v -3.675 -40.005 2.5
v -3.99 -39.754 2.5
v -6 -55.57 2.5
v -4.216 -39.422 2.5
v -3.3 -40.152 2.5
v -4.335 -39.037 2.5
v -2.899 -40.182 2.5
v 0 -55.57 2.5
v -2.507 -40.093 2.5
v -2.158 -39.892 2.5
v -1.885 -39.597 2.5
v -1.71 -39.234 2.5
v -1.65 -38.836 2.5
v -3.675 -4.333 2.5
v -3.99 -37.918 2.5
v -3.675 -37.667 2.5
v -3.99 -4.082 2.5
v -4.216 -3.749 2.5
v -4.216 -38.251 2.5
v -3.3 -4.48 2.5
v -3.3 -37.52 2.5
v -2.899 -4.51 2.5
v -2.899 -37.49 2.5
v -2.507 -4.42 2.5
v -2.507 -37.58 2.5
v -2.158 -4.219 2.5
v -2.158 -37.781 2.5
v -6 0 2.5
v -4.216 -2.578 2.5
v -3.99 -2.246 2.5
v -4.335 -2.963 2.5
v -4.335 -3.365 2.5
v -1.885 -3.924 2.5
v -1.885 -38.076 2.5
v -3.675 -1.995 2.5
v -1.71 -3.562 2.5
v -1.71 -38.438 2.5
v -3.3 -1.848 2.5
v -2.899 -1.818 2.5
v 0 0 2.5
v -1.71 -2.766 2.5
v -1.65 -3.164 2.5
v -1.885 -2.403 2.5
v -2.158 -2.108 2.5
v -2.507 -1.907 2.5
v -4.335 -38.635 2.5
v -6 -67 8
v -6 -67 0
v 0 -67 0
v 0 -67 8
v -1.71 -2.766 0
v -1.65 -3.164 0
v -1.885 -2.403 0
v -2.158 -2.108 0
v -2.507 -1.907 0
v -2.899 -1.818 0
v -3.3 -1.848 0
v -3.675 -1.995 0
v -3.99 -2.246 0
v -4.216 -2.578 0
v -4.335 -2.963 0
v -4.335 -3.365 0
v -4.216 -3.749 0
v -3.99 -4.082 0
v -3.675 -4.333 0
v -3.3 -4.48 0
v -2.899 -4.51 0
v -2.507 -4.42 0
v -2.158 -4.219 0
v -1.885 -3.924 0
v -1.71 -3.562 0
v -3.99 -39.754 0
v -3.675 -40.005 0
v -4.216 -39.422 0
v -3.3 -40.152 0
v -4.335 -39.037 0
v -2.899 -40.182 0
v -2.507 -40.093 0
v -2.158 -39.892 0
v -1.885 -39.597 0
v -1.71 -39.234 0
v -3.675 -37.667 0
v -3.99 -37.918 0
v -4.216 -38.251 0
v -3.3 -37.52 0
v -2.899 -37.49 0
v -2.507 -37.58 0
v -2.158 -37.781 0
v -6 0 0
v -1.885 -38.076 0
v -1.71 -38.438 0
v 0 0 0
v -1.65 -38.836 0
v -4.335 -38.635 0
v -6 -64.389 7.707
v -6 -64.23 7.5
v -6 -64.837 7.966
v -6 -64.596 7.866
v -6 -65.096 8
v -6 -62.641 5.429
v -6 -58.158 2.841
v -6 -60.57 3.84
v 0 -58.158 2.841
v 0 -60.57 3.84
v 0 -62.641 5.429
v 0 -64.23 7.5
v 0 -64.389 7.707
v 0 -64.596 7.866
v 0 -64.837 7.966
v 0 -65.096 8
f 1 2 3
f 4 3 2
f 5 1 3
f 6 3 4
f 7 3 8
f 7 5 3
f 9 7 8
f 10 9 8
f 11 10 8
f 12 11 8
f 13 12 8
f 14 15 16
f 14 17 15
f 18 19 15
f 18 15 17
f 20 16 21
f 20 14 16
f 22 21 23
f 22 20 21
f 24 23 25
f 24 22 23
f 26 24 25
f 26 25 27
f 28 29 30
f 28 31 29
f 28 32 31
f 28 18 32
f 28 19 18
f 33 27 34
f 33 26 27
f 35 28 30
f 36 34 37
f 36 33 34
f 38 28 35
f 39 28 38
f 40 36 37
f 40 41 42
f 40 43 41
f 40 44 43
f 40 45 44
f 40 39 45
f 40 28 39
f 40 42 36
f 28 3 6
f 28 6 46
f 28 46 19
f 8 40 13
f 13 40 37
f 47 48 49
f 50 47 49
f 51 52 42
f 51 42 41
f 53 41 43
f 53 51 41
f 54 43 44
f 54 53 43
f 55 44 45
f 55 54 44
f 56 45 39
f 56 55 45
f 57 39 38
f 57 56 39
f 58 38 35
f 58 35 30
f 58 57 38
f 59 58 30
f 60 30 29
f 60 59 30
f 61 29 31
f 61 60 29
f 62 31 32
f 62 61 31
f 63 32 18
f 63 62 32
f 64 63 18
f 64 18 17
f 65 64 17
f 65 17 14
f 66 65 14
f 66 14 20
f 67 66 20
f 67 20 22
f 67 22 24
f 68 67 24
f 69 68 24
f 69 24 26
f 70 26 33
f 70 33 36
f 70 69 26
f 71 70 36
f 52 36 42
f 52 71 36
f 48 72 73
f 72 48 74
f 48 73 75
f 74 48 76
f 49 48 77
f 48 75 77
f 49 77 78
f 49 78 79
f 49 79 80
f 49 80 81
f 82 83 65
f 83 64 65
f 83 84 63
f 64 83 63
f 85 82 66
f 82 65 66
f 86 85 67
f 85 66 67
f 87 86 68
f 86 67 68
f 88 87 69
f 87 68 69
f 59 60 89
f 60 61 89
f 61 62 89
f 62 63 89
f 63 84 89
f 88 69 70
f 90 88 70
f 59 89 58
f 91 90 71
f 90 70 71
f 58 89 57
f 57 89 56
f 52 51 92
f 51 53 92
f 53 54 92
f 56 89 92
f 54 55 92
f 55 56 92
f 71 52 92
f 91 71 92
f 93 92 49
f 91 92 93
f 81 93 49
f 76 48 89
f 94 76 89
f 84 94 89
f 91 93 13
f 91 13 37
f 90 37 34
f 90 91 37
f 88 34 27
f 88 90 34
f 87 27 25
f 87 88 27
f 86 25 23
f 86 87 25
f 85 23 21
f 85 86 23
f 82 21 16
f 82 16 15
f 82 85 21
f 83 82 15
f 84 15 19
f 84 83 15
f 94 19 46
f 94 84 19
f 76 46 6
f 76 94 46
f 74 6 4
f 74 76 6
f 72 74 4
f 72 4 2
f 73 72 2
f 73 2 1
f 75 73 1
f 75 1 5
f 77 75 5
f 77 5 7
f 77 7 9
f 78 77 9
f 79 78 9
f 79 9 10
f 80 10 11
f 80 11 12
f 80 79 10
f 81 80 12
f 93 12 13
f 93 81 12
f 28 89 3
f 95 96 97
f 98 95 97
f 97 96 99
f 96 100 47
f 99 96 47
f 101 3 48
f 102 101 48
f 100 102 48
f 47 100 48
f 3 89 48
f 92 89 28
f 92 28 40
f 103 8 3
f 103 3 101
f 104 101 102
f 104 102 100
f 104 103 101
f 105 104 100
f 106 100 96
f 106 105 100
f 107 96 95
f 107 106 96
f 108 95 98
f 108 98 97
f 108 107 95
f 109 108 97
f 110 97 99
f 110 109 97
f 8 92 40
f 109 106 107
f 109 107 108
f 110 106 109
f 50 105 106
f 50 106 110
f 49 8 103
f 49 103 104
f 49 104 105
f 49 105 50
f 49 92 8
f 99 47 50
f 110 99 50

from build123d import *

# Parameters (mm, degrees)
SKICA2_W                = 6
SKICA2_H                = 42
SKICA2_R                = 1.35
SKICA2_H_2              = 25
P_IDAT_VYSUNUT_M1_DEPTH = 2.5
SKICA3_W                = 6
SKICA3_H                = 8
P_IDAT_VYSUNUT_M2_DEPTH = 2.5
ZAOBLIT1_R              = 10
ZAOBLIT2_R              = 1


with BuildPart() as part:
    # Skica2 → Přidat vysunutím1 (new body)
    # profile 1 of 2: a face of its own
    with BuildSketch(Plane.XY):
        with Locations((-3, -21)):
            Rectangle(SKICA2_W, SKICA2_H)
        with Locations((-3, -38.83625)):
            Circle(SKICA2_R, mode=Mode.SUBTRACT)
        with Locations((-3, -3.16375)):
            Circle(SKICA2_R, mode=Mode.SUBTRACT)
    # profile 2 of 2: a face of its own
    with BuildSketch(Plane.XY):
        with Locations((-3, -54.5)):
            Rectangle(SKICA2_W, SKICA2_H_2)
    extrude(amount=P_IDAT_VYSUNUT_M1_DEPTH)

    # Skica3 → Přidat vysunutím2 (add)
    with BuildSketch(Plane.XZ.offset(67)):
        with Locations((-3, 4)):
            Rectangle(SKICA3_W, SKICA3_H)
    extrude(amount=-P_IDAT_VYSUNUT_M2_DEPTH)

    # Zaoblit1
    # the kernel refuses this fillet: 10 mm, written as the material it adds along each edge
    with BuildSketch(Plane(origin=(0, -64.5, 2.5), x_dir=(0, 1, 0), z_dir=(-1, 0, 0))) as zaoblit1_piece_1:
        with BuildLine():
            CenterArc((8.93028555, -10), ZAOBLIT1_R, 90, 63.25631605)
            Line((0, -5.5), (-0.178605711, -5.41))
            ThreePointArc((-0.178605711, -5.41), (-0.2, -2.75), (-0.2, 0))
            Line((-0.2, 0), (0, 0.2))
            Line((0, 0.2), (8.93028555, 0.2))
            Line((8.93028555, 0.2), (8.93028555, 0))
        make_face()
    extrude(amount=6)

    # Zaoblit2
    zaoblit2_edges = [part.edges().sort_by_distance(p)[0] for p in [
        (-3, -64.5, 8),
    ]]
    fillet(zaoblit2_edges, radius=ZAOBLIT2_R)


solid = part.part
